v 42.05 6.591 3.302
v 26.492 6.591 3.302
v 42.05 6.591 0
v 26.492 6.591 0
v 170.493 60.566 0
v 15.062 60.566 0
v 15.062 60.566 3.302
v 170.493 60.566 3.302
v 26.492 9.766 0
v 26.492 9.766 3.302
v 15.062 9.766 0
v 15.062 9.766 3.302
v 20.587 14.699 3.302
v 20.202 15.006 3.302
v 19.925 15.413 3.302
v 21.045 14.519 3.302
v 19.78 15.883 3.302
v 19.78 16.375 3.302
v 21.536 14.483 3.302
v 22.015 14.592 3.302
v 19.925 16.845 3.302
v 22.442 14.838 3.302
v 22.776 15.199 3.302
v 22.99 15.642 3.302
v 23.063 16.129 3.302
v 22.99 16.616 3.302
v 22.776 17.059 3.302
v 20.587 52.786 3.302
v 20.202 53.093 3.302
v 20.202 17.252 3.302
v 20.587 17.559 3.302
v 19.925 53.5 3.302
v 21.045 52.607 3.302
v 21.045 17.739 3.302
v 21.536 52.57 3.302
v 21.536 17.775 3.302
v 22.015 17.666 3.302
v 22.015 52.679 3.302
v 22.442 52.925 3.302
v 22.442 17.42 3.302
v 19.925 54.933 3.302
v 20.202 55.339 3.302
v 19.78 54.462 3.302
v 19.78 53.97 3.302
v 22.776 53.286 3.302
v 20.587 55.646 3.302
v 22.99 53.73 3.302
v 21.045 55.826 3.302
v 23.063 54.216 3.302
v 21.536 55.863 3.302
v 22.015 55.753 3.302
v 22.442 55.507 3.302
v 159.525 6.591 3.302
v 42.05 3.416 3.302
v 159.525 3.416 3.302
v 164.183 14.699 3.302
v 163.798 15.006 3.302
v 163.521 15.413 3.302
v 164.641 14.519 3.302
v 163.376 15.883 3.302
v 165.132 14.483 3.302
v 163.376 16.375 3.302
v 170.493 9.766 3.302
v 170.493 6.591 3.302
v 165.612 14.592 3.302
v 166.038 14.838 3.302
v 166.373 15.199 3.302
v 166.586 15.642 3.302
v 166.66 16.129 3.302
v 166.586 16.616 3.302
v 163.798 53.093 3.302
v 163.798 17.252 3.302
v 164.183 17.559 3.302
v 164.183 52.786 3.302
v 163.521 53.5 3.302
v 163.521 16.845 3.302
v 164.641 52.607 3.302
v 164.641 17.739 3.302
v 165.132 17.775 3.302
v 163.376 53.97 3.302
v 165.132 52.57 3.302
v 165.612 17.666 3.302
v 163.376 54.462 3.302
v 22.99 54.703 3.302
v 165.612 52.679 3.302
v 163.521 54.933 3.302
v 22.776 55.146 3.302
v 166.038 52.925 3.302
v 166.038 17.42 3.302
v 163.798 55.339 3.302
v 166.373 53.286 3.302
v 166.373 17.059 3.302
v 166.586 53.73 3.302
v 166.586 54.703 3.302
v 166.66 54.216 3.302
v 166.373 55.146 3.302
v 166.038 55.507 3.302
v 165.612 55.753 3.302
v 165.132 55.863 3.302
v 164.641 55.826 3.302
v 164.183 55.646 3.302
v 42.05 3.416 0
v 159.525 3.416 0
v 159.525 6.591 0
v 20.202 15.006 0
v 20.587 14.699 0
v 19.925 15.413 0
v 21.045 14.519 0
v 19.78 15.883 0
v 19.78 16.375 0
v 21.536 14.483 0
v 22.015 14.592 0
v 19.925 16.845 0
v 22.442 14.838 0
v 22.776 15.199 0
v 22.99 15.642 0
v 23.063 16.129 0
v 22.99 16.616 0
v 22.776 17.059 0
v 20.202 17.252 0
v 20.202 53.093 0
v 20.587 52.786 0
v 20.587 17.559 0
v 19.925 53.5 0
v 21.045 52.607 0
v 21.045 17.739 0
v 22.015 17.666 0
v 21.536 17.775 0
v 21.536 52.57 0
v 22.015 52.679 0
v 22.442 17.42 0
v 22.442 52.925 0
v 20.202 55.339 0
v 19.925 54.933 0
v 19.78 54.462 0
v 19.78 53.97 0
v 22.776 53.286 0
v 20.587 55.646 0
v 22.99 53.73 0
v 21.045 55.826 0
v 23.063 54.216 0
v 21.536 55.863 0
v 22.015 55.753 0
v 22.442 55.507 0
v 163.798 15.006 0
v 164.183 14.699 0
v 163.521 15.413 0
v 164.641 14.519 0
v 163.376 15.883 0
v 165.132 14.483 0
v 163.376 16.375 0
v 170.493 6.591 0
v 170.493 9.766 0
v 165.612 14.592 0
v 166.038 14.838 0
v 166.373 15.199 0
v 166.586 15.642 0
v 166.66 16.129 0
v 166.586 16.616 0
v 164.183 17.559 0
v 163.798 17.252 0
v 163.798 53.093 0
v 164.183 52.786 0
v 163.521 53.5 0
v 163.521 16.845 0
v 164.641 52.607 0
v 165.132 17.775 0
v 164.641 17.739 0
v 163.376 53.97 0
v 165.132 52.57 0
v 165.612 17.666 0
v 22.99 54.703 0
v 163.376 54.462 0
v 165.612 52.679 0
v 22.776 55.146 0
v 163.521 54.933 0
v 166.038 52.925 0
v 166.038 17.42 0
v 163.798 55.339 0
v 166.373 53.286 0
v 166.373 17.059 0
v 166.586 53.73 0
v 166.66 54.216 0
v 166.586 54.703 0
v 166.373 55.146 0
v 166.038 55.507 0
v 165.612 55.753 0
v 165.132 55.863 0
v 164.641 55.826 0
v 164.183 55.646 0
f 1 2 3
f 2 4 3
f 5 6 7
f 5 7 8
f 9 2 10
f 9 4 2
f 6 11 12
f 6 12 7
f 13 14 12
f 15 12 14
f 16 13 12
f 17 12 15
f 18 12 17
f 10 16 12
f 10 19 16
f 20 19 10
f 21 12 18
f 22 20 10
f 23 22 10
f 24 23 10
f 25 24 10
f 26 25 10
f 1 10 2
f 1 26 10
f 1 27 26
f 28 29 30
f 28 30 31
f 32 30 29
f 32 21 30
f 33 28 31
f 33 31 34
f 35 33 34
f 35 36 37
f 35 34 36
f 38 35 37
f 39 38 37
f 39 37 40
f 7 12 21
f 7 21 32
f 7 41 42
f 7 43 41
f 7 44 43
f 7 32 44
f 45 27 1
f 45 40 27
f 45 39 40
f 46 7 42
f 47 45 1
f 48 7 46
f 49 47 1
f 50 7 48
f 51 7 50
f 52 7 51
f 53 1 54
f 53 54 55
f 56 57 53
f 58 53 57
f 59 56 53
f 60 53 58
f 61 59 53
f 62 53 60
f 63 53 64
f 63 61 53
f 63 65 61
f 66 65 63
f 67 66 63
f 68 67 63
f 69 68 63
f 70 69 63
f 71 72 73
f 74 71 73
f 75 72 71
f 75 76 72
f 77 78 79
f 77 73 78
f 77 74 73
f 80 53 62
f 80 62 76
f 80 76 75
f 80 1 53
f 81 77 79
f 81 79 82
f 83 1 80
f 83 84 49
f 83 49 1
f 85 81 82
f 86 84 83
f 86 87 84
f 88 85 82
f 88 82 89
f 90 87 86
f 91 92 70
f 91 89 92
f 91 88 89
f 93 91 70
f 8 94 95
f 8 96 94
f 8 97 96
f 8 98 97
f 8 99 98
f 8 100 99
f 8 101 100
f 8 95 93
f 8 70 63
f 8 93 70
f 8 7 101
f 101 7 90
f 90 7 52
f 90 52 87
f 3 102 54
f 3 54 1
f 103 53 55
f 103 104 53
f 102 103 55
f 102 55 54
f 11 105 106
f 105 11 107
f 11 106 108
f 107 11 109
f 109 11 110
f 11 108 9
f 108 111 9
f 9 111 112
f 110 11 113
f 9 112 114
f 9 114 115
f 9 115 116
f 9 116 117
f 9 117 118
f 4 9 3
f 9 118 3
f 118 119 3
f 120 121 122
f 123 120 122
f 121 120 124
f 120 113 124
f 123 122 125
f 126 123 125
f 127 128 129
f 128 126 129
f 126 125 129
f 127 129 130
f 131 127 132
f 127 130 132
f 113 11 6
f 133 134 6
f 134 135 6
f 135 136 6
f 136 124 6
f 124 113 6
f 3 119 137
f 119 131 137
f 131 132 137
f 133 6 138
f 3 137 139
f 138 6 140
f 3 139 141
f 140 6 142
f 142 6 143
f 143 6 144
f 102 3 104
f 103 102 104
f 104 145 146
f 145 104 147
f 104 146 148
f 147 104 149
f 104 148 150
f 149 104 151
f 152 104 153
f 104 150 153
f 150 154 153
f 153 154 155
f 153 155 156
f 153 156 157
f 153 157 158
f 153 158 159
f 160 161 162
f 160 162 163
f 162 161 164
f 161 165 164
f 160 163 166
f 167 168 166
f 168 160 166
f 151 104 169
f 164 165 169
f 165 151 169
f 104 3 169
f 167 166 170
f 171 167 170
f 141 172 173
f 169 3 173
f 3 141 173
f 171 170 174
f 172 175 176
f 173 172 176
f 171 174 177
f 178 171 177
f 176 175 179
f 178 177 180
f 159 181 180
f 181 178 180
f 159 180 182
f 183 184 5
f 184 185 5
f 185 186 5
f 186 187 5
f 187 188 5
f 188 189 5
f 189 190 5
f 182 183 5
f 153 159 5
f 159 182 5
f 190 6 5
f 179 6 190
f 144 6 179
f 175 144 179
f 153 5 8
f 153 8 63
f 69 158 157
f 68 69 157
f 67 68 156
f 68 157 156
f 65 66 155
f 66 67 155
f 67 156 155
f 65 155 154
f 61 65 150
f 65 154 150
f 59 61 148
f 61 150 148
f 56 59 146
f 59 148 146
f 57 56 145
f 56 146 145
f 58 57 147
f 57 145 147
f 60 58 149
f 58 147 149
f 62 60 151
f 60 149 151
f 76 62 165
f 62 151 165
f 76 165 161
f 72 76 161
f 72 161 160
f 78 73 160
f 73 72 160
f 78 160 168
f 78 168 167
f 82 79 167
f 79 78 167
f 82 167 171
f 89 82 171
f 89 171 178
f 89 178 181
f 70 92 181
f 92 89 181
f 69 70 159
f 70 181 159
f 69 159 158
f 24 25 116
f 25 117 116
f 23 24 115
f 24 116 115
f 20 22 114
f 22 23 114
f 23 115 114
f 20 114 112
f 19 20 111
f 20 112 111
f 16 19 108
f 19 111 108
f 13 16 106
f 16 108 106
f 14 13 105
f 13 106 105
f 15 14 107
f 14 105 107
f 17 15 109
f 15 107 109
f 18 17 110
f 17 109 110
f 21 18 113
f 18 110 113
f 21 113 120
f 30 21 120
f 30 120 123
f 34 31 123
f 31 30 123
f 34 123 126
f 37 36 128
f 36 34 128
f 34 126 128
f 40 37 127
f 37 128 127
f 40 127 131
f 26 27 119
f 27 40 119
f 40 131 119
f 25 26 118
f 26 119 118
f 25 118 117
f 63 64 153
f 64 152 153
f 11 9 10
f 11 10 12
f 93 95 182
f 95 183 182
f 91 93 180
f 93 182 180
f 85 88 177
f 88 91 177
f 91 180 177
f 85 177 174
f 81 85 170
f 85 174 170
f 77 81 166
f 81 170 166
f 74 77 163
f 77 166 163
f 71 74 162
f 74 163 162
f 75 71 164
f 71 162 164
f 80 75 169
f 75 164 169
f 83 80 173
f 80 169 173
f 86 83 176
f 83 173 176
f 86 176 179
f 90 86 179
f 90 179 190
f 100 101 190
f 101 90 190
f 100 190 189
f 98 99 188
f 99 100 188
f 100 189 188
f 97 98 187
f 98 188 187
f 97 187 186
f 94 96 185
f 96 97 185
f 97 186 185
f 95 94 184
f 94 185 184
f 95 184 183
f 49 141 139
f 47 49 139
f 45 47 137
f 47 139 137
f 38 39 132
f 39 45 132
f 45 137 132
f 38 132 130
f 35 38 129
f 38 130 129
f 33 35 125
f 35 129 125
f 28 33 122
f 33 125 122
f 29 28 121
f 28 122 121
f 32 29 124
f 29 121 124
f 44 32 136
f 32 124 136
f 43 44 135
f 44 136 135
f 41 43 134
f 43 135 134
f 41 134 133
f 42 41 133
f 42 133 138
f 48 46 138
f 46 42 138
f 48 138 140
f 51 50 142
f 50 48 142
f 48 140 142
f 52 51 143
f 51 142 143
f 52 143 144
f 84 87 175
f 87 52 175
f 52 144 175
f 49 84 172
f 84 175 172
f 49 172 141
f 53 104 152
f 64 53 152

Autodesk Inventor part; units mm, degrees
ref_plane "YZ Plane" through (0, 0, 0) normal (1, 0, 0) x (0, 1, 0)
ref_plane "XZ Plane" through (0, 0, 0) normal (0, 1, 0) x (-1, 0, 0)
ref_plane "XY Plane" through (0, 0, 0) normal (0, 0, 1) x (1, 0, 0)
sketch "Sketch1" plane through (0, 0, 0) normal (0, 0, 1) x (1, 0, 0)
  line L0 (15.0622, 60.5663) -> (170.4927, 60.5663)
  line L1 (170.4927, 60.5663) -> (170.4927, 9.7663)
  line L2 (15.0622, 9.7663) -> (15.0622, 60.5663)
  line L3 (170.4927, 9.7663) -> (170.4927, 6.5913)
  line L4 (26.4922, 6.5913) -> (26.4922, 9.7663)
  line L5 (159.5247, 6.5913) -> (159.5247, 3.4163)
  line L6 (159.5247, 3.4163) -> (42.0497, 3.4163)
  line L7 (42.0497, 3.4163) -> (42.0497, 6.5913)
  circle A0 centre (21.4122, 54.2163) radius 1.651
  circle A1 centre (21.4122, 16.129) radius 1.651
  circle A2 centre (165.0087, 16.129) radius 1.651
  circle A3 centre (165.0087, 54.2163) radius 1.651
  line L8 (33.3756, 50.5714) -> (117.4496, 50.5714)
  line L9 (117.4496, 50.5714) -> (117.4496, 28.8544)
  line L10 (117.4496, 28.8544) -> (33.3756, 28.8544)
  line L11 (33.3756, 28.8544) -> (33.3756, 50.5714)
  line L12 (39.2811, 23.114) -> (50.0761, 23.114)
  line L13 (50.0761, 23.114) -> (50.0761, 12.319)
  line L14 (50.0761, 12.319) -> (39.2811, 12.319)
  line L15 (39.2811, 12.319) -> (39.2811, 23.114)
  line L16 (54.6481, 23.114) -> (65.4431, 23.114)
  line L17 (65.4431, 23.114) -> (65.4431, 12.319)
  line L18 (65.4431, 12.319) -> (54.6481, 12.319)
  line L19 (54.6481, 12.319) -> (54.6481, 23.114)
  line L20 (70.0151, 23.114) -> (80.8101, 23.114)
  line L21 (80.8101, 23.114) -> (80.8101, 12.319)
  line L22 (80.8101, 12.319) -> (70.0151, 12.319)
  line L23 (70.0151, 12.319) -> (70.0151, 23.114)
  line L24 (85.3821, 23.114) -> (96.1771, 23.114)
  line L25 (96.1771, 23.114) -> (96.1771, 12.319)
  line L26 (96.1771, 12.319) -> (85.3821, 12.319)
  line L27 (85.3821, 12.319) -> (85.3821, 23.114)
  line L28 (100.7491, 23.114) -> (111.5441, 23.114)
  line L29 (111.5441, 23.114) -> (111.5441, 12.319)
  line L30 (111.5441, 12.319) -> (100.7491, 12.319)
  line L31 (100.7491, 12.319) -> (100.7491, 23.114)
  line L32 (138.7221, 23.114) -> (149.5171, 23.114)
  line L33 (149.5171, 23.114) -> (149.5171, 12.319)
  line L34 (149.5171, 12.319) -> (138.7221, 12.319)
  line L35 (138.7221, 12.319) -> (138.7221, 23.114)
  line L36 (170.4927, 9.7663) -> (170.4927, 9.7663)
  line L37 (26.4922, 9.7663) -> (15.0622, 9.7663)
  line L38 (26.4922, 6.5913) -> (42.0497, 6.5913)
  line L39 (159.5247, 6.5913) -> (170.4927, 6.5913)
  circle A4 centre (144.1196, 41.5163) radius 3.4925
  line L40 (144.1196, 23.114) -> (144.1196, 12.319)
  circle A5 centre (44.6786, 17.7165) radius 5.3975
  circle A6 centre (60.0456, 17.7165) radius 5.3975
  circle A7 centre (75.4126, 17.7165) radius 5.3975
  circle A8 centre (90.7796, 17.7165) radius 5.3975
  circle A9 centre (106.1466, 17.7165) radius 5.3975
  circle A10 centre (144.1196, 17.7165) radius 5.3975
  dimension "d0" = 3.302
  dimension "d1" = 6.35
  dimension "d2" = 6.35
  dimension "d3" = 84.074
  dimension "d4" = 21.717
  dimension "d5" = 10.795
  dimension "d6" = 10.795
  dimension "d7" = 10.795
  dimension "d8" = 10.795
  dimension "d9" = 10.795
  dimension "d10" = 10.795
  dimension "d11" = 10.795
  dimension "d12" = 4.572
  dimension "d13" = 4.572
  dimension "d14" = 4.572
  dimension "d15" = 4.572
  dimension "d16" = 5.9055
  dimension "d17" = 5.9055
  dimension "d21" = 6.985
  dimension "d22" = 26.67
  dimension "d25" = 0
  dimension "d26" = 3.302
  dimension "d28" = 3.302
  dimension "d32" = 50.8
  dimension "d33" = 155.4305
  dimension "d34" = 6.35
  dimension "d39" = 26.373
  dimension "d40" = 19.05
  dimension "d41" = 29.6164
  dimension "d43" = 15.367
  dimension "d44" = 37.973
sketch "Sketch2" plane through (0, 0, 0) normal (0, 0, 1) x (1, 0, 0)
  line L0 (15.0622, 9.7663) -> (15.0622, 60.5663) projected
  line L1 (15.0622, 60.5663) -> (170.4927, 60.5663) projected
  line L2 (33.3756, 50.5714) -> (117.4496, 50.5714) projected
  line L3 (117.4496, 50.5714) -> (117.4496, 28.8544) projected
  line L4 (170.4927, 60.5663) -> (170.4927, 9.7663) projected
  line L5 (159.5247, 6.5913) -> (170.4927, 6.5913) projected
  line L6 (159.5247, 6.5913) -> (159.5247, 3.4163) projected
  line L7 (159.5247, 3.4163) -> (42.0497, 3.4163) projected
  line L8 (42.0497, 3.4163) -> (42.0497, 6.5913) projected
  line L9 (26.4922, 6.5913) -> (42.0497, 6.5913) projected
  line L10 (26.4922, 6.5913) -> (26.4922, 9.7663) projected
  line L11 (26.4922, 9.7663) -> (15.0622, 9.7663) projected
  circle A0 centre (21.4122, 16.129) radius 1.651 projected
  circle A1 centre (21.4122, 54.2163) radius 1.651 projected
  circle A2 centre (165.0087, 54.2163) radius 1.651 projected
  circle A3 centre (165.0087, 16.129) radius 1.651 projected
  line L12 (15.0622, 60.5663) -> (15.0622, 9.7663)
  line L13 (15.0622, 9.7663) -> (26.4922, 9.7663)
  line L14 (26.4922, 9.7663) -> (26.4922, 6.5913)
  line L15 (26.4922, 6.5913) -> (42.0497, 6.5913)
  line L16 (42.0497, 6.5913) -> (42.0497, 3.4163)
  line L17 (42.0497, 3.4163) -> (159.5247, 3.4163)
  line L18 (159.5247, 3.4163) -> (159.5247, 6.5913)
  line L19 (159.5247, 6.5913) -> (170.4927, 6.5913)
  line L20 (170.4927, 6.5913) -> (170.4927, 60.5663)
  line L21 (170.4927, 60.5663) -> (15.0622, 60.5663)
  circle A4 centre (21.4122, 54.2163) radius 1.651
  circle A5 centre (21.4122, 16.129) radius 1.651
  circle A6 centre (165.0087, 16.129) radius 1.651
  circle A7 centre (165.0087, 54.2163) radius 1.651
  point P0 (0, 0)
  point P1 (144.1196, 41.5163)
surface extrude "ExtrusionSrf1" sketch "Sketch1" along normal blind 3.302 shown yes curves L0 L1 L36 L3 L39 L5 L6 L7 L38 L4 L37 L2
extrude "Extrusion1" add sketch "Sketch2" along normal blind 3.302
equation "\"d35\" = d28"
equation "\"d37\" = d28"
properties part number "FP_PCB"
